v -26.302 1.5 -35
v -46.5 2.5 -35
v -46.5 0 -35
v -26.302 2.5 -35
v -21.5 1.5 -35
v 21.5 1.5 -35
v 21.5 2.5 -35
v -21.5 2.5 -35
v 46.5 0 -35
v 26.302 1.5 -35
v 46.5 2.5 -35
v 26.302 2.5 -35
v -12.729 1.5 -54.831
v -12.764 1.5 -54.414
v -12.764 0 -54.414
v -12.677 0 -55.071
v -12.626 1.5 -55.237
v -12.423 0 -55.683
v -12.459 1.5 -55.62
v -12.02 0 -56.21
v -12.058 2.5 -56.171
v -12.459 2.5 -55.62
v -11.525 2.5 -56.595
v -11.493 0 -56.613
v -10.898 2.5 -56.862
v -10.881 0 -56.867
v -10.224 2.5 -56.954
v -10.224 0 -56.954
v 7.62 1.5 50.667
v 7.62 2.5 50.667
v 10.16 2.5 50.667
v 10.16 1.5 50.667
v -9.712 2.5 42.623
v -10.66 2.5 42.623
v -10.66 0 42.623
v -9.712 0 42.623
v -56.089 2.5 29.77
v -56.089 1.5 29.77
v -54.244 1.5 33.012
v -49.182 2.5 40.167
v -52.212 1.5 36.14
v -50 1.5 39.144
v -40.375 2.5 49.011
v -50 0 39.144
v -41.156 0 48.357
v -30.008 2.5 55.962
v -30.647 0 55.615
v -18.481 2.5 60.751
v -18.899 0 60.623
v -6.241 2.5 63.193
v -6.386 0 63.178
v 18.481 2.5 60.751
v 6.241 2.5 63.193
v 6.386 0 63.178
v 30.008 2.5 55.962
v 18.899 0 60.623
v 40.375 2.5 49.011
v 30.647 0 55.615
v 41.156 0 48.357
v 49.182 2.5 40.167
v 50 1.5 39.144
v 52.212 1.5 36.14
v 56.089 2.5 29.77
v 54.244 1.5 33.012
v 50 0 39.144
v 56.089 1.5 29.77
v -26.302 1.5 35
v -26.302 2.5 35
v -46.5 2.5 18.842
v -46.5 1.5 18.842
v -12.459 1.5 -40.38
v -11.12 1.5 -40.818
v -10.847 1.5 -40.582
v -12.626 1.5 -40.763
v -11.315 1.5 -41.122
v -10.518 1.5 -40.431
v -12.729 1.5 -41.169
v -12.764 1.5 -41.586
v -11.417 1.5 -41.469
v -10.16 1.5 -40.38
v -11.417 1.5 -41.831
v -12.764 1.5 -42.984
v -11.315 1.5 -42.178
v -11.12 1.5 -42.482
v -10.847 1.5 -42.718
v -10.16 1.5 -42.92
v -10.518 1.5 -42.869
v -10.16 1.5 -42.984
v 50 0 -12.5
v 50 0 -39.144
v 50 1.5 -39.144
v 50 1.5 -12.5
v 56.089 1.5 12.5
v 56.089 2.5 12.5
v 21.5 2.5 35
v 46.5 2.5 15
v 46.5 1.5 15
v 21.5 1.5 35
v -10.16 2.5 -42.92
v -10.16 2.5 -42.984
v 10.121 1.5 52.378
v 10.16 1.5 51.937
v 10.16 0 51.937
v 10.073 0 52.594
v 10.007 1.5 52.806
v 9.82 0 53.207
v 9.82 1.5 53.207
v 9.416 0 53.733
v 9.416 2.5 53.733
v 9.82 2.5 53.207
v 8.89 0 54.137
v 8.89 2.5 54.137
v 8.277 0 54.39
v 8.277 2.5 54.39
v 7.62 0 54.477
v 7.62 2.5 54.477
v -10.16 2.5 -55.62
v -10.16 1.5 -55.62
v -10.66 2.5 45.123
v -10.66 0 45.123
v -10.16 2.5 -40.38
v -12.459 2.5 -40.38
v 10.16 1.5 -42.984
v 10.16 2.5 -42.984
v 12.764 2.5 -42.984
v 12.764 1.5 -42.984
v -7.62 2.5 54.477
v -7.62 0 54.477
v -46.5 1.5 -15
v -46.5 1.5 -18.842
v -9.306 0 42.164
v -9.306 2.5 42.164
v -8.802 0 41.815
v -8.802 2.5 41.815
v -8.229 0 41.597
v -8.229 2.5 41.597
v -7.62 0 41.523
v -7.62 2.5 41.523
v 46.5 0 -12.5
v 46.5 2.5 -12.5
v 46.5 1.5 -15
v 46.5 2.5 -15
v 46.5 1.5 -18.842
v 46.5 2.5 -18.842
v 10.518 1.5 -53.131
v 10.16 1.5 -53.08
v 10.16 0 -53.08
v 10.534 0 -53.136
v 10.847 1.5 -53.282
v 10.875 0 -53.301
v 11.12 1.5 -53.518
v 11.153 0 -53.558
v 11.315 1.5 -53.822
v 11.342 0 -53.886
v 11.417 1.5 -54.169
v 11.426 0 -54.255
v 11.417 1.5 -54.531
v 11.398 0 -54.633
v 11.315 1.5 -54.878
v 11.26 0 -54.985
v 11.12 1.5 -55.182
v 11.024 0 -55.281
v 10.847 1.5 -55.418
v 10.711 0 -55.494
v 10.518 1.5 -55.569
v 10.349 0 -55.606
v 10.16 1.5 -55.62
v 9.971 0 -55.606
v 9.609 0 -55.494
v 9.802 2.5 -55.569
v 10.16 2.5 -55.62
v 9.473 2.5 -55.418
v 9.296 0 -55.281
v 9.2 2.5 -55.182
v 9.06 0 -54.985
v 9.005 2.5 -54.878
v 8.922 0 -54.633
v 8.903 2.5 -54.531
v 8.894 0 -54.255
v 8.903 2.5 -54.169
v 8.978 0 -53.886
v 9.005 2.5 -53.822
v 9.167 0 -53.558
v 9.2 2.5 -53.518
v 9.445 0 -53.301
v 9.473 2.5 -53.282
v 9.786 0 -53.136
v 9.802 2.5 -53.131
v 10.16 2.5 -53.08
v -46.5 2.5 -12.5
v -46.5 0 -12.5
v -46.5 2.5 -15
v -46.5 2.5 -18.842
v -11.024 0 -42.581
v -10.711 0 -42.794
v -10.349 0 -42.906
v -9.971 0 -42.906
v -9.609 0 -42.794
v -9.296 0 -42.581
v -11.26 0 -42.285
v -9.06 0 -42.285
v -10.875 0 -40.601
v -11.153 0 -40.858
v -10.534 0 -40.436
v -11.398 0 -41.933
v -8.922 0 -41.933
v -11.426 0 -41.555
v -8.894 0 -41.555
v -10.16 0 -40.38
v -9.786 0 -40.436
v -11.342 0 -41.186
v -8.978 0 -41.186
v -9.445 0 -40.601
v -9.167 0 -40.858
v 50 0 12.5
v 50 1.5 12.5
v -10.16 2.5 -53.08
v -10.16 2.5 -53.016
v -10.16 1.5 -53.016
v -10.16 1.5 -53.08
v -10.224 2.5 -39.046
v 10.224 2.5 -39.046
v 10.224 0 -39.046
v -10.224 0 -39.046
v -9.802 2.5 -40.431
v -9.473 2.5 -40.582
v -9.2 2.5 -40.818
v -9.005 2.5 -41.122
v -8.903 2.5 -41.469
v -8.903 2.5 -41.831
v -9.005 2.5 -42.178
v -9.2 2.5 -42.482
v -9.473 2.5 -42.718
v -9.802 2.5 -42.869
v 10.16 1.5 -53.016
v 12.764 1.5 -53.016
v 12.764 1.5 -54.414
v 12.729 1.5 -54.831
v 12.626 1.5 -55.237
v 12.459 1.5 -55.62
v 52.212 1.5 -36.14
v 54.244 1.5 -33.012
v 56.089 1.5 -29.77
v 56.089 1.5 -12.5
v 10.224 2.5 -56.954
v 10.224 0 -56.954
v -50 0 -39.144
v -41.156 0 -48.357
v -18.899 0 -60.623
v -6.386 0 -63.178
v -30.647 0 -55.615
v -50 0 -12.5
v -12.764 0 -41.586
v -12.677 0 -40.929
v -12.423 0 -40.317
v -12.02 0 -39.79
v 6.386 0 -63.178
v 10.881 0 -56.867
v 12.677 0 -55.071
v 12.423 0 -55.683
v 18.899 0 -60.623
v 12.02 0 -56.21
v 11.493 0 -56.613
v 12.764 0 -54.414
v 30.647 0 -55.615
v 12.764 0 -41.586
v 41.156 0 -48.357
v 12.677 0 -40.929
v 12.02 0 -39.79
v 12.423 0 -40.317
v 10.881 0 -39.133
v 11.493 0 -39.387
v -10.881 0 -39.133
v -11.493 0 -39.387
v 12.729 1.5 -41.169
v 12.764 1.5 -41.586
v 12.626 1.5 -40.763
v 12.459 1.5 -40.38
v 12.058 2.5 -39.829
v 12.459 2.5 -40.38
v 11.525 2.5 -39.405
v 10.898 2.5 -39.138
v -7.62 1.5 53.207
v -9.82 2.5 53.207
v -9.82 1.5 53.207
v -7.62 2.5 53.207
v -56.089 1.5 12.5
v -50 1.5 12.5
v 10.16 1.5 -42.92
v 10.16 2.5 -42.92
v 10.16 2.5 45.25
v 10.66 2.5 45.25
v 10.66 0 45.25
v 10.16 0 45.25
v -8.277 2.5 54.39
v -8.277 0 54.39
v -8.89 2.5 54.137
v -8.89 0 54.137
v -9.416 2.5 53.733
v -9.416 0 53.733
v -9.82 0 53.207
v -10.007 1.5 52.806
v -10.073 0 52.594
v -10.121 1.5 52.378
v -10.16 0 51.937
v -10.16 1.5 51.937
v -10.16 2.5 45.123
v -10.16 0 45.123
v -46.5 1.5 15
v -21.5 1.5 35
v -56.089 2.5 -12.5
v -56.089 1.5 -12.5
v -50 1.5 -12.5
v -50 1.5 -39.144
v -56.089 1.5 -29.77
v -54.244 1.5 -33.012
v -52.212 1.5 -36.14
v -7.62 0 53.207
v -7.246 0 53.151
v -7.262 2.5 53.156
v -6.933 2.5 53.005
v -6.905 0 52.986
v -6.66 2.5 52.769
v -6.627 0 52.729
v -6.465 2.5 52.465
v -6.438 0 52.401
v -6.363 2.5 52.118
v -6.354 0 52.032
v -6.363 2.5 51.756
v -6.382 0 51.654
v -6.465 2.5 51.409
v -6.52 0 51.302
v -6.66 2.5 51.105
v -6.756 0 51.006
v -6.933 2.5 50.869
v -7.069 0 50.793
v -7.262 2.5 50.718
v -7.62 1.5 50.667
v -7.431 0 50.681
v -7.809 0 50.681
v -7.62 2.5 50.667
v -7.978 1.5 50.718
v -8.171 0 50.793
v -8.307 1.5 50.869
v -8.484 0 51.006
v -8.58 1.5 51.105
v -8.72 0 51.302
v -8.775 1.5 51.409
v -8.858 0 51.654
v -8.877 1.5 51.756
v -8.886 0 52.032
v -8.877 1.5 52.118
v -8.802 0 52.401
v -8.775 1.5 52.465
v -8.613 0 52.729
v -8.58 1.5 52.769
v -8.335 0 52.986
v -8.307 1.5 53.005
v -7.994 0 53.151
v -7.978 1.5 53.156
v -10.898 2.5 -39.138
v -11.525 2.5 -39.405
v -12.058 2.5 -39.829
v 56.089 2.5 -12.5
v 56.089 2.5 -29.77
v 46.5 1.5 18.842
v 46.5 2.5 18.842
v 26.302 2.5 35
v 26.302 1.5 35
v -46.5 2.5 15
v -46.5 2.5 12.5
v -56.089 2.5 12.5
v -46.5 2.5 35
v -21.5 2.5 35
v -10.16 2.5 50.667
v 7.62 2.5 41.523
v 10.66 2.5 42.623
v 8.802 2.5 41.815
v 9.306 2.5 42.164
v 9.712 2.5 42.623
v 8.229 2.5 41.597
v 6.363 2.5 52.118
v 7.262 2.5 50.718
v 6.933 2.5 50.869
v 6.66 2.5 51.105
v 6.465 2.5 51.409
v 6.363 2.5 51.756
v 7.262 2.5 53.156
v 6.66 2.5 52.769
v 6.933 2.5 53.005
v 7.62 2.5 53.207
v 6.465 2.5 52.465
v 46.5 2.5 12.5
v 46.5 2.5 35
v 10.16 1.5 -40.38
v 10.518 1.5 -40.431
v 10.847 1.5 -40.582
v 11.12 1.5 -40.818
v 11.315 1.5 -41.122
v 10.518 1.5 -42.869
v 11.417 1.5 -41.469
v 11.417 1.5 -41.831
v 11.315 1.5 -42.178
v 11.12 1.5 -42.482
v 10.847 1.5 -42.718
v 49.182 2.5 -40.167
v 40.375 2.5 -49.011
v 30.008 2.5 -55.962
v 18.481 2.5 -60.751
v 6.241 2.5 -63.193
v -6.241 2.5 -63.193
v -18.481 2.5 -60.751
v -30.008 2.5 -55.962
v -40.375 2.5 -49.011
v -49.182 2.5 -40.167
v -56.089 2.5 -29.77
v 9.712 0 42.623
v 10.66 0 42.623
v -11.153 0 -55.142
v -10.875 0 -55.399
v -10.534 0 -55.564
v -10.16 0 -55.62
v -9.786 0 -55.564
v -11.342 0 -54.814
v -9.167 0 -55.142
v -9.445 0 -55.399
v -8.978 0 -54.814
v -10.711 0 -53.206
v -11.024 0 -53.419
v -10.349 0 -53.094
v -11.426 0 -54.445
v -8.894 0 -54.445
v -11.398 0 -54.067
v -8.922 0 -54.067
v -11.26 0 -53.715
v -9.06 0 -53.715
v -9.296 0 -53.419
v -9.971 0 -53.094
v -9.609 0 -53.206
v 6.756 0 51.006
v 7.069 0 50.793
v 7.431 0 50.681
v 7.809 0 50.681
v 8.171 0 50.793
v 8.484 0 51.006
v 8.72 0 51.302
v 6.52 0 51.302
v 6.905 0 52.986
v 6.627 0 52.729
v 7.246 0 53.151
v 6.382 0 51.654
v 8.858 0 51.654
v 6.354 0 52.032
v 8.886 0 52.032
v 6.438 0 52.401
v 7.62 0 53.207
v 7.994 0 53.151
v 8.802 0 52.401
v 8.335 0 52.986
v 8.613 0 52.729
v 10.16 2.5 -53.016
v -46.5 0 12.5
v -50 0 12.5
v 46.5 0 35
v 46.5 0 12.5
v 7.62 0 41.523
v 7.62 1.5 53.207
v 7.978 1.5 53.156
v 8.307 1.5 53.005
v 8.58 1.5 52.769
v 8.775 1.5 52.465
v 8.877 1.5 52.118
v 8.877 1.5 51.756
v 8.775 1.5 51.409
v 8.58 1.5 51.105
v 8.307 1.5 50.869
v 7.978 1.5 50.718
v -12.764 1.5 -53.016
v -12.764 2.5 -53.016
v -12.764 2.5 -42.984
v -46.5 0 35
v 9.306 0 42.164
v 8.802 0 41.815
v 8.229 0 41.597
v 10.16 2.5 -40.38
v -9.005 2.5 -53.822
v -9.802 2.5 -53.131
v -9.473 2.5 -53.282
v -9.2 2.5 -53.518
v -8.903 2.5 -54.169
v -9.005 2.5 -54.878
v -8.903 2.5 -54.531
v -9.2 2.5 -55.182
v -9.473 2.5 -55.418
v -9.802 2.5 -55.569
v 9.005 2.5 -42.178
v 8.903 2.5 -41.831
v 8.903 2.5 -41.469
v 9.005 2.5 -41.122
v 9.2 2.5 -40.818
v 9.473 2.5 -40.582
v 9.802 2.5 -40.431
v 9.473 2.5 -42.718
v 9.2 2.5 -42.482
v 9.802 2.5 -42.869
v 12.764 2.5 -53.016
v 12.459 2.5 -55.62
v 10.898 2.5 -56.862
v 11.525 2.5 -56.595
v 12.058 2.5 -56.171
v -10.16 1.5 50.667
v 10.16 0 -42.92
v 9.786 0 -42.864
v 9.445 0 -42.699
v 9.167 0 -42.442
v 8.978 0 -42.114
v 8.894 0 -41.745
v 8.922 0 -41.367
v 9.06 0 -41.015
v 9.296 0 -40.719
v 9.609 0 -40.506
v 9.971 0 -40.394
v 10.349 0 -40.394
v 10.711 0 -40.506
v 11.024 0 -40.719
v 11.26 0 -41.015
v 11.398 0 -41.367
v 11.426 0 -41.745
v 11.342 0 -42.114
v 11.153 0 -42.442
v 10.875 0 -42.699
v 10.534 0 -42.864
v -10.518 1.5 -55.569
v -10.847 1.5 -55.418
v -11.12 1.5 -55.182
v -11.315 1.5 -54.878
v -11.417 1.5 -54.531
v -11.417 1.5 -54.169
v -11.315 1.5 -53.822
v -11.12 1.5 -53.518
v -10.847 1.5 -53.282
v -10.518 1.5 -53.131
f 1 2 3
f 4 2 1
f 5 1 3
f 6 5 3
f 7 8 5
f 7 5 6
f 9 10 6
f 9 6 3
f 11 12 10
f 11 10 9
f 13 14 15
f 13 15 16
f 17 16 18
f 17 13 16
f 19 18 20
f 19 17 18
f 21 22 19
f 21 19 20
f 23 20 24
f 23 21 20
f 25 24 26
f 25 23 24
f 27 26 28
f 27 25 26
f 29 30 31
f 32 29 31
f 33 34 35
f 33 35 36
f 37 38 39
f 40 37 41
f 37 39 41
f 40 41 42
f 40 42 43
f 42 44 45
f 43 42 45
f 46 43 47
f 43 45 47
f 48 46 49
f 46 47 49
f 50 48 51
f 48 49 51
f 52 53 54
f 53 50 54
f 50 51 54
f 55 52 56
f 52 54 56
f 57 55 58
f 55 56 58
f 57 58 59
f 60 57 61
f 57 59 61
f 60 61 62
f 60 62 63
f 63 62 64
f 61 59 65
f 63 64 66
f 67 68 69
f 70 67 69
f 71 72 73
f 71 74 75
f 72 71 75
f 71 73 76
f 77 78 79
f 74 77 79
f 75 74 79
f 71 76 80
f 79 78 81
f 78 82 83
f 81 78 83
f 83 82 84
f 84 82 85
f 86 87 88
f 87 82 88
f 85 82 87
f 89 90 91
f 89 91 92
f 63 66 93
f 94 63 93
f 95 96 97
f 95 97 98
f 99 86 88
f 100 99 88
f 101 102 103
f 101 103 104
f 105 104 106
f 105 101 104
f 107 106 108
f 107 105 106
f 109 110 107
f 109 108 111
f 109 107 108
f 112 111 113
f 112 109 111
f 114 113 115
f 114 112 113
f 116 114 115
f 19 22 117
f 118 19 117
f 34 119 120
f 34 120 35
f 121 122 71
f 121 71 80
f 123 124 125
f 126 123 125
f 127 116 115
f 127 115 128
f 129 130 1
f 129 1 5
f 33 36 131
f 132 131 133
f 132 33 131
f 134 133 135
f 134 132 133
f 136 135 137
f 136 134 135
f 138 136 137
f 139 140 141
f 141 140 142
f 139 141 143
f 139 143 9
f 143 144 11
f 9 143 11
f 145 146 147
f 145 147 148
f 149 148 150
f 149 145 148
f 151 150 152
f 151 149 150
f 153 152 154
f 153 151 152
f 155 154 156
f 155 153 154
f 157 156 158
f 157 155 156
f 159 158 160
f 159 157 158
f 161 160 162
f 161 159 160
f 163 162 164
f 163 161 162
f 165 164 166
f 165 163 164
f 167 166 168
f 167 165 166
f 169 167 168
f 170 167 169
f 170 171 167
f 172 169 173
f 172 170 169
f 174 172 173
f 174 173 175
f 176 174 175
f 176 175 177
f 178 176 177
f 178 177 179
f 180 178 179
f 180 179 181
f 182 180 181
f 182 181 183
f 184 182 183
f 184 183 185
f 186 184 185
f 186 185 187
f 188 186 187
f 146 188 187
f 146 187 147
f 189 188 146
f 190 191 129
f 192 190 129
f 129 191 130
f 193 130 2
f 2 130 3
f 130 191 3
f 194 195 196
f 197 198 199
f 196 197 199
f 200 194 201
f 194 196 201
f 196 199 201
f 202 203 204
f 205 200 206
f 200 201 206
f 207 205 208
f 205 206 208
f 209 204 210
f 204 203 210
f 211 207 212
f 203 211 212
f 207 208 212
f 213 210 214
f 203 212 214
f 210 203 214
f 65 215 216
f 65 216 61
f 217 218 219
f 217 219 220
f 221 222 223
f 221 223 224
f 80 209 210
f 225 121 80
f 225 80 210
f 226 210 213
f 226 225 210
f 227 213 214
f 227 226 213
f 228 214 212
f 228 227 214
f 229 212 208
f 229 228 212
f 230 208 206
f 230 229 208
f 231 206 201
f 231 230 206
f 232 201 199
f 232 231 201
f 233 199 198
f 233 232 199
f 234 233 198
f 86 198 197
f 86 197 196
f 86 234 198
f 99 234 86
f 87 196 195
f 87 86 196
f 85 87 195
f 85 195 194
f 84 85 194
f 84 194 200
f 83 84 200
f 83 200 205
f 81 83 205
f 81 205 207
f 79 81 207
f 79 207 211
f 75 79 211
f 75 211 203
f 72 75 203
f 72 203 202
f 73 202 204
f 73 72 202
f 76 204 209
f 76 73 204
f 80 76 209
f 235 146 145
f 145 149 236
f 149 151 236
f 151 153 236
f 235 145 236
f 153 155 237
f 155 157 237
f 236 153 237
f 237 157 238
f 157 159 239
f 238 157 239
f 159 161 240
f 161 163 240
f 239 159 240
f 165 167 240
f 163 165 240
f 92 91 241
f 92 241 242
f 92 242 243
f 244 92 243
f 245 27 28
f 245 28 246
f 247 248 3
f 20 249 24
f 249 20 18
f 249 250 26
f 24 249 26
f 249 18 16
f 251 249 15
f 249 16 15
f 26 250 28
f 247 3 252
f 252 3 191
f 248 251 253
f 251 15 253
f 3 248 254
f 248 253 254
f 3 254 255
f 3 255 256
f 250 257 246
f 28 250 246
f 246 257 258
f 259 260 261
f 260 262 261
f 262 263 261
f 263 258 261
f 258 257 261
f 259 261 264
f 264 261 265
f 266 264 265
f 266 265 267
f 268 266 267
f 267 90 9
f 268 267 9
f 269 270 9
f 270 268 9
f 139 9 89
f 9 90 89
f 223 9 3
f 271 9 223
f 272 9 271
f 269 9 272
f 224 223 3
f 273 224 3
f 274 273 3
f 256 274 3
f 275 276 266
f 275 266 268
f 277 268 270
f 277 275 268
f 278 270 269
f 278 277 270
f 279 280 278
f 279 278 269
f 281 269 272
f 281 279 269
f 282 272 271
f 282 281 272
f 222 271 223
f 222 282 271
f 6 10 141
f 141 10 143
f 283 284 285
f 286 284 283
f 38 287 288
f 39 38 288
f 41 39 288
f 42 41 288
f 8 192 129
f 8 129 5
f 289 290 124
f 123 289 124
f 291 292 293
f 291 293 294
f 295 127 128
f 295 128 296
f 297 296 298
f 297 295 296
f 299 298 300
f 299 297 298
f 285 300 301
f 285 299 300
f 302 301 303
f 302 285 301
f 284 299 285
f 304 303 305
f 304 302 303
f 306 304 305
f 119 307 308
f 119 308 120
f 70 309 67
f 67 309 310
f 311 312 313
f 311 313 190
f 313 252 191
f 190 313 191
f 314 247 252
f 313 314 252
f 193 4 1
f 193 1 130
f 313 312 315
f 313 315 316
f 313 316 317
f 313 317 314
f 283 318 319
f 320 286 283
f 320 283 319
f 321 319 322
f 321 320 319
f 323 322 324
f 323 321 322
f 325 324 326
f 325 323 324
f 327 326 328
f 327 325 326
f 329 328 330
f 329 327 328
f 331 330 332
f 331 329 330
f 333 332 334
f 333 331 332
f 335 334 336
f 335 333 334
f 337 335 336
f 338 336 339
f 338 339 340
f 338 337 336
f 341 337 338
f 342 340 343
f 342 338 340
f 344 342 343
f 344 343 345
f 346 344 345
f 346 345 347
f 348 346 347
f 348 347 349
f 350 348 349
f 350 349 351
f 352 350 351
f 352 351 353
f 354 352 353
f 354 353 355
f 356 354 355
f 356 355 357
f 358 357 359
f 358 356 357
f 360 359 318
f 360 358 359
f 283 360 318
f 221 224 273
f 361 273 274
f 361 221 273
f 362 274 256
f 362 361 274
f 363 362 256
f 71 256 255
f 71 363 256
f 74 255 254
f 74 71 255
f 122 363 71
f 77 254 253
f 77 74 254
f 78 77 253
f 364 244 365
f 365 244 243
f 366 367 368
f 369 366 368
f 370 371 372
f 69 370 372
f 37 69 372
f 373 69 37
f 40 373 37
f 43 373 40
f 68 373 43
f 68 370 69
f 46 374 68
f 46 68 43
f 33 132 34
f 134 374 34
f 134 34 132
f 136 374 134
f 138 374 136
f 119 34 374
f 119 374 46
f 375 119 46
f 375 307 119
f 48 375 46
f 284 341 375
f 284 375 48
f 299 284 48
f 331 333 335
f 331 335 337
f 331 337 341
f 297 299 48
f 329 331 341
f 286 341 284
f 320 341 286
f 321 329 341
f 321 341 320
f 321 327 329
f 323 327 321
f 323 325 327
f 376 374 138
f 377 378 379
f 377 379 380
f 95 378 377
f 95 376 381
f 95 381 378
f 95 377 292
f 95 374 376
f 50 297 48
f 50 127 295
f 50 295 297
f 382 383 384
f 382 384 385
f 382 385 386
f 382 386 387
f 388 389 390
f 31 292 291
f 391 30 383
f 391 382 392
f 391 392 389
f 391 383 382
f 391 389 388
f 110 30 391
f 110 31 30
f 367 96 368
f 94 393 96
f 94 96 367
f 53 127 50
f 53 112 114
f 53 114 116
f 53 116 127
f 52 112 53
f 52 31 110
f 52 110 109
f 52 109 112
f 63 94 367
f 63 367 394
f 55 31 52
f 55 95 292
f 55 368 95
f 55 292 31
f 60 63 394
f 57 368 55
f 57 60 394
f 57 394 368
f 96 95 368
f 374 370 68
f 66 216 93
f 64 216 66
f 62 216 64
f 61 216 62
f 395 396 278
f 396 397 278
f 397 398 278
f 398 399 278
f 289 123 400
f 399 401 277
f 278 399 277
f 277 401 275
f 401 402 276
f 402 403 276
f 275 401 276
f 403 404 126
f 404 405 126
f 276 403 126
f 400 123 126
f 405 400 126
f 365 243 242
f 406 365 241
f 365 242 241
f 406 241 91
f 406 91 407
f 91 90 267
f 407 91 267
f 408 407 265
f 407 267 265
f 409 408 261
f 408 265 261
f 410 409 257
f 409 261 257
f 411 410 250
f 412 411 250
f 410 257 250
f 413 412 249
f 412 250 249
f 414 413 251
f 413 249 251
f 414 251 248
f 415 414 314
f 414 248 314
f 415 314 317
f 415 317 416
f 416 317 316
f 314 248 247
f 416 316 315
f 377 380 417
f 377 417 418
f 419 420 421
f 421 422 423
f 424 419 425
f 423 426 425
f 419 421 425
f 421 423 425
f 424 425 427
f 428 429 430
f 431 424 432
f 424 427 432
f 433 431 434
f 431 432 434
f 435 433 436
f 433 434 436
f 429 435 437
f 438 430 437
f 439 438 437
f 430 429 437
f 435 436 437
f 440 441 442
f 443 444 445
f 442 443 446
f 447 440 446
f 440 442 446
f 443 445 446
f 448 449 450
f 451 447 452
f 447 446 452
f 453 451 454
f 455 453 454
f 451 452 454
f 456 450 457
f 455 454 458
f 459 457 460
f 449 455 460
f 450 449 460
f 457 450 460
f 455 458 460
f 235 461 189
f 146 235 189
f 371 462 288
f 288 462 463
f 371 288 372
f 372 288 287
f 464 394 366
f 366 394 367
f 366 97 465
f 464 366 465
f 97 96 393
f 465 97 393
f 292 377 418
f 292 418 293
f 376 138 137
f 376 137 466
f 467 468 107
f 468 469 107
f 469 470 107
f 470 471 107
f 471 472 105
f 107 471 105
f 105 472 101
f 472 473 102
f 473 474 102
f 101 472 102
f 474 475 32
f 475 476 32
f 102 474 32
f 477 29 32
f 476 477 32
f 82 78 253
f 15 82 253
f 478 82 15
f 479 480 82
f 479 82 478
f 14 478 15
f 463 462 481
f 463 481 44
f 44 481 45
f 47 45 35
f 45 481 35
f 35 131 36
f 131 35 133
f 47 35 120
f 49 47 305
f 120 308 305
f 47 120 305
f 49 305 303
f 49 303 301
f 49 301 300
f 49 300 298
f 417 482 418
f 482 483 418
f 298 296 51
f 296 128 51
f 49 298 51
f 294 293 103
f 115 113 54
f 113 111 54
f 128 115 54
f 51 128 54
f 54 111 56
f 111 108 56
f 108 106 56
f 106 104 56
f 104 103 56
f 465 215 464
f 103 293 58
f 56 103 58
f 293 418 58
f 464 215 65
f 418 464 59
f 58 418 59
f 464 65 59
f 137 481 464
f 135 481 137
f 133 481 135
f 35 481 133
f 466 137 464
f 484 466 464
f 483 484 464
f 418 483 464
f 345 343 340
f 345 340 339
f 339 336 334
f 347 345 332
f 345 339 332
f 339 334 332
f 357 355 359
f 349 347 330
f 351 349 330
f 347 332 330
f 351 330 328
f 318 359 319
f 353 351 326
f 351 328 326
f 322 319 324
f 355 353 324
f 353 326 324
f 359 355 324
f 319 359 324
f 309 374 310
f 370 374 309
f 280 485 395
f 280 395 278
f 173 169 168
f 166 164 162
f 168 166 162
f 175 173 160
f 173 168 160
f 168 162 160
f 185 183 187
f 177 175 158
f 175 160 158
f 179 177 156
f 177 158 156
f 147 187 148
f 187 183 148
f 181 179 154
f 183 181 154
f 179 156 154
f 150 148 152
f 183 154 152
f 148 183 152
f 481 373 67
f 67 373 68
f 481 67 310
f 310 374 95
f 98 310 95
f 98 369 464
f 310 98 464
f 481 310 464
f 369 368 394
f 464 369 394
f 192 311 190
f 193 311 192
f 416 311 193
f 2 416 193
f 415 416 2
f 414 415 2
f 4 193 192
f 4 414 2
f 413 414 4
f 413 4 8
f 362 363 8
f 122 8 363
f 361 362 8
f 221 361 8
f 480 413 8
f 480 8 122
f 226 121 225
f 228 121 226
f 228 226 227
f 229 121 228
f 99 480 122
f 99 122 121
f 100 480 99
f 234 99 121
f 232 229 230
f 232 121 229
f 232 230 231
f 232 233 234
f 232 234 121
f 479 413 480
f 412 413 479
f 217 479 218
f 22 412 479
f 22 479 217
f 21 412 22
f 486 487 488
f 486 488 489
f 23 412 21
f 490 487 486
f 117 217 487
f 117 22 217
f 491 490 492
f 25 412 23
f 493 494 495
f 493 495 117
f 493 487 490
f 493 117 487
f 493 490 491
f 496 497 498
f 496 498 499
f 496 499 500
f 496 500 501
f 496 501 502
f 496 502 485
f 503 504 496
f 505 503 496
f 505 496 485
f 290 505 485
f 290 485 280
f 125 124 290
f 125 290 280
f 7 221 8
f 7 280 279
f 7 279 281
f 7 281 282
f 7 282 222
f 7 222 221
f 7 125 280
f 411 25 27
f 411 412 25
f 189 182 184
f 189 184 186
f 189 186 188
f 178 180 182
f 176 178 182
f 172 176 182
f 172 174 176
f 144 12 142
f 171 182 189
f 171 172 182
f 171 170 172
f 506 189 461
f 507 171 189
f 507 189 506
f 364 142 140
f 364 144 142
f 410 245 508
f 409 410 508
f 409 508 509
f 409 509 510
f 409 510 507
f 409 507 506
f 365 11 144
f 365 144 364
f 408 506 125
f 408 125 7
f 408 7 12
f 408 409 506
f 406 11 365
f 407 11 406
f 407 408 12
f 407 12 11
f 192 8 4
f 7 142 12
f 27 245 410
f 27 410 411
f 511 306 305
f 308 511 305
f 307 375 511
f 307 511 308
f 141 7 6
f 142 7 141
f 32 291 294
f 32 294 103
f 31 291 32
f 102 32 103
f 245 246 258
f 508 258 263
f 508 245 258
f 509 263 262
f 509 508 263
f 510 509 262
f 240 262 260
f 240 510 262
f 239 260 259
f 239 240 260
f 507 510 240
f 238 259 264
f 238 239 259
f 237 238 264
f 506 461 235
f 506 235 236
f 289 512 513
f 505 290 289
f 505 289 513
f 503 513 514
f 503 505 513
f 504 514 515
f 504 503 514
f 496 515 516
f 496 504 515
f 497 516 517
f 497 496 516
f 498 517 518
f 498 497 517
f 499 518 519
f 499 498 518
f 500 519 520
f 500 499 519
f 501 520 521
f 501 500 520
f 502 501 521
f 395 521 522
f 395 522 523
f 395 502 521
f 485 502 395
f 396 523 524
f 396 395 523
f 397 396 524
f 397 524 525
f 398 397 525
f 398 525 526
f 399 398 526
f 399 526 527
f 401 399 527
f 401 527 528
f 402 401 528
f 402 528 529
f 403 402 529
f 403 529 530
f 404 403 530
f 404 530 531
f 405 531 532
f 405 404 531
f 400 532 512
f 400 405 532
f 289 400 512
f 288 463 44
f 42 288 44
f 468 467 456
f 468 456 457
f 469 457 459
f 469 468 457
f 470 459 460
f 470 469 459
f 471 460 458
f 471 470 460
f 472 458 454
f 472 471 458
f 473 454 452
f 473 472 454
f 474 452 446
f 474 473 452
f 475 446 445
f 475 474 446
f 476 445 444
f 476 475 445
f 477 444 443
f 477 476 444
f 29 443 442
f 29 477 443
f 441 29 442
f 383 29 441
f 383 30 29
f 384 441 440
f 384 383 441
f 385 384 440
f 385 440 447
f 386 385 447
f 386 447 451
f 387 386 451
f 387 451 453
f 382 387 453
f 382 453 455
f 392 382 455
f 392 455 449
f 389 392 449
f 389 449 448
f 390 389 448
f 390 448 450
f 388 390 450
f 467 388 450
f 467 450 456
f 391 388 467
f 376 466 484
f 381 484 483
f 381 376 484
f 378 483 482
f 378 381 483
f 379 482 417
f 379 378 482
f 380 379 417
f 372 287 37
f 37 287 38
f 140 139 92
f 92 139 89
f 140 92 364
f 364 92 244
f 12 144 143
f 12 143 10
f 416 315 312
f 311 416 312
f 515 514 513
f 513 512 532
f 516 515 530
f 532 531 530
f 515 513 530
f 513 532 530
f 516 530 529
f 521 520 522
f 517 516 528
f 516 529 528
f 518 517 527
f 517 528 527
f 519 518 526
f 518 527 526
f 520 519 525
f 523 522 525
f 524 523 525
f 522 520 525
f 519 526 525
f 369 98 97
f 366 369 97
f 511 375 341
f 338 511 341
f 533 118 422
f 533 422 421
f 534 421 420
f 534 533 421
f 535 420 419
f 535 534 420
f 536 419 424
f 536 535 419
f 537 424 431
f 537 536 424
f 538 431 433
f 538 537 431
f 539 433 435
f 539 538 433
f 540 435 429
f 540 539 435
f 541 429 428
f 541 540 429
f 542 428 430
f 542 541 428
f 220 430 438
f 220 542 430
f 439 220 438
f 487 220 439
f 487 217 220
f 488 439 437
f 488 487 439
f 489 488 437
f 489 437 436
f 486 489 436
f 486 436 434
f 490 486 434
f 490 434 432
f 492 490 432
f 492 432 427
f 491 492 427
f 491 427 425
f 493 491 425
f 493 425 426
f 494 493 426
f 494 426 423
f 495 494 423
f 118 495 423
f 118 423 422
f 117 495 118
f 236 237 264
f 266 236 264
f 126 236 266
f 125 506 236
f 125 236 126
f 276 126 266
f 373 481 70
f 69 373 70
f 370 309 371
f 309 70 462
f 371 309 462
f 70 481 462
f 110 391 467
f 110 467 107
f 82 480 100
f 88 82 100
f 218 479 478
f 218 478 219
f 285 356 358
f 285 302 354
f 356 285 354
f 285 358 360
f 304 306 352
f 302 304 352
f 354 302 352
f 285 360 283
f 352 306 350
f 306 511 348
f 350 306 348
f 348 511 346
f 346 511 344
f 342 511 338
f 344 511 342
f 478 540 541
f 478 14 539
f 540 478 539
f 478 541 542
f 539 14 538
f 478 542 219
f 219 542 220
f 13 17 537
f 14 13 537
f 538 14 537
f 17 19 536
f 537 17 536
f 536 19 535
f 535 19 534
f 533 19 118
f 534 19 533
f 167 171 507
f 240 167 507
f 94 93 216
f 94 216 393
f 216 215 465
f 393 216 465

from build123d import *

# Parameters (mm, degrees)
SKETCH1_R           = 63.5
BOSS_EXTRUDE1_DEPTH = 2.5
CUT_EXTRUDE3_DEPTH  = 10
SKETCH2_W           = 93
SKETCH2_H           = 70
CUT_EXTRUDE4_DEPTH  = 1.5
CUT_EXTRUDE5_START  = -10
CUT_EXTRUDE5_DEPTH  = 10
SKETCH6_W           = 10
SKETCH6_H           = 26.950646815
CUT_EXTRUDE6_DEPTH  = 1.5
SKETCH7_R           = 1.27
CUT_EXTRUDE7_DEPTH  = 85.761427807
SKETCH8_W           = 2.6035
SKETCH8_H           = 2.6035
SKETCH8_W_2         = 2.54
SKETCH8_H_2         = 2.54
BOSS_EXTRUDE4_DEPTH = 1


with BuildPart() as part:
    # Sketch1 → Boss-Extrude1 (new body)
    with BuildSketch(Plane(origin=(0, 0, 0), x_dir=(1, 0, 0), z_dir=(0, 1, 0))):
        with Locations(Location((0, 0, 0), (0, 0, 270))):
            Circle(SKETCH1_R)
    extrude(amount=BOSS_EXTRUDE1_DEPTH)

    # Sketch4 → Cut-Extrude3 (cut)
    with BuildSketch(Plane(origin=(0, 2.5, 0), x_dir=(1, 0, 0), z_dir=(0, 1, 0))):
        Polygon((-46.5, 15), (-21.5, 35), (21.5, 35), (46.5, 15), (46.5, -15), (21.5, -35), (-21.5, -35), (-46.5, -15), align=None)
        Polygon((-46.5, 35), (-26.302343178, 35), (-46.5, 18.841874542), align=None)
        Polygon((-46.5, -35), (-26.302343178, -35), (-46.5, -18.841874542), align=None)
        Polygon((46.5, 35), (46.5, 18.841874542), (26.302343178, 35), align=None)
        Polygon((46.5, -18.841874542), (26.302343178, -35), (46.5, -35), align=None)
    extrude(amount=-CUT_EXTRUDE3_DEPTH, mode=Mode.SUBTRACT)

    # Sketch2 → Cut-Extrude4 (cut)
    with BuildSketch(Plane(origin=(0, 0, 0), x_dir=(1, 0, 0), z_dir=(0, 1, 0))):
        Rectangle(SKETCH2_W, SKETCH2_H)
    extrude(amount=CUT_EXTRUDE4_DEPTH, mode=Mode.SUBTRACT)

    # Sketch5 → Cut-Extrude5 (cut)
    with BuildSketch(Plane(origin=(0, 2.5, 0), x_dir=(1, 0, 0), z_dir=(0, 1, 0)).offset(CUT_EXTRUDE5_START)):
        with BuildLine():
            Line((-56.089211476, 12.5), (-46.5, 12.5))
            Line((-46.5, 12.5), (-46.5, -12.5))
            Line((-46.5, -12.5), (-56.089211476, -12.5))
            Line((-56.089211476, -12.5), (-56.089211476, -29.769957273))
            ThreePointArc((-56.089211476, -29.769957273), (-63.5, 0), (-56.089211476, 29.769957273))
            Line((-56.089211476, 29.769957273), (-56.089211476, 12.5))
        make_face()
        with BuildLine():
            Line((56.089211476, 12.5), (56.089211476, 29.769957273))
            ThreePointArc((56.089211476, 29.769957273), (63.5, 0), (56.089211476, -29.769957273))
            Line((56.089211476, -29.769957273), (56.089211476, -12.5))
            Line((56.089211476, -12.5), (46.5, -12.5))
            Line((46.5, -12.5), (46.5, 12.5))
            Line((46.5, 12.5), (56.089211476, 12.5))
        make_face()
    extrude(amount=CUT_EXTRUDE5_DEPTH, mode=Mode.SUBTRACT)


with BuildPart() as cut_extrude5_piece_1:
    # of the separate pieces the step leaves, piece 1, a body of its own (cut_extrude5_pieces)
    add(part.part.solids().sort_by_distance((56.089211476, 0, -29.769957273))[0])


with BuildPart() as cut_extrude5_piece_2:
    # of the separate pieces the step leaves, piece 2, a body of its own (cut_extrude5_pieces)
    add(part.part.solids().sort_by_distance((-56.089211476, 0, 29.769957273))[0])


with BuildPart() as cut_extrude6_tool:
    # Sketch6 → Cut-Extrude6 (new body)
    with BuildSketch(Plane.XZ):
        with Locations((55, -25.975323407)):
            Rectangle(SKETCH6_W, SKETCH6_H)
        with Locations((-55, -25.975323407)):
            Rectangle(SKETCH6_W, SKETCH6_H)
        with Locations((-55, 25.975323407)):
            Rectangle(SKETCH6_W, SKETCH6_H)
        with Locations((55, 25.975323407)):
            Rectangle(SKETCH6_W, SKETCH6_H)
    extrude(amount=-CUT_EXTRUDE6_DEPTH)


with BuildPart() as cut_extrude5_piece_1_1:
    add(cut_extrude5_piece_1.part)

    # Cut-Extrude6: cut by cut_extrude6_tool
    add(cut_extrude6_tool.part, mode=Mode.SUBTRACT)


with BuildPart() as cut_extrude5_piece_2_1:
    add(cut_extrude5_piece_2.part)

    # Cut-Extrude6: cut by cut_extrude6_tool
    add(cut_extrude6_tool.part, mode=Mode.SUBTRACT)


with BuildPart() as cut_extrude7_tool:
    # Sketch7 → Cut-Extrude7 (new, through all)
    # profile 1 of 2: a face of its own
    with BuildSketch(Plane(origin=(0, 2.5, 0), x_dir=(1, 0, 0), z_dir=(0, 1, 0))):
        with BuildLine():
            Line((-10.2235, 56.9535), (10.2235, 56.9535))
            ThreePointArc((10.2235, 56.9535), (12.019551224, 56.209551224), (12.7635, 54.4135))
            Line((12.7635, 54.4135), (12.7635, 41.5865))
            ThreePointArc((12.7635, 41.5865), (12.019551224, 39.790448776), (10.2235, 39.0465))
            Line((10.2235, 39.0465), (-10.2235, 39.0465))
            ThreePointArc((-10.2235, 39.0465), (-12.019551224, 39.790448776), (-12.7635, 41.5865))
            Line((-12.7635, 41.5865), (-12.7635, 54.4135))
            ThreePointArc((-12.7635, 54.4135), (-12.019551224, 56.209551224), (-10.2235, 56.9535))
        make_face()
        with Locations(Location((10.16, 54.35, 0), (0, 0, 270))):
            Circle(SKETCH7_R, mode=Mode.SUBTRACT)
        with Locations(Location((-10.16, 54.35, 0), (0, 0, 90))):
            Circle(SKETCH7_R, mode=Mode.SUBTRACT)
        with Locations(Location((10.16, 41.65, 0), (0, 0, 90))):
            Circle(SKETCH7_R, mode=Mode.SUBTRACT)
        with Locations(Location((-10.16, 41.65, 0), (0, 0, 270))):
            Circle(SKETCH7_R, mode=Mode.SUBTRACT)
    # profile 2 of 2: a face of its own
    with BuildSketch(Plane(origin=(0, 2.5, 0), x_dir=(1, 0, 0), z_dir=(0, 1, 0))):
        with BuildLine():
            Line((-7.62, -41.523), (7.62, -41.523))
            ThreePointArc((7.62, -41.523), (8.801947545, -41.814756241), (9.712367081, -42.623))
            Line((9.712367081, -42.623), (10.66, -42.623))
            Line((10.66, -42.623), (10.66, -45.25))
            Line((10.66, -45.25), (10.16, -45.25))
            Line((10.16, -45.25), (10.16, -51.937))
            ThreePointArc((10.16, -51.937), (9.416051224, -53.733051224), (7.62, -54.477))
            Line((7.62, -54.477), (-7.62, -54.477))
            ThreePointArc((-7.62, -54.477), (-9.416051224, -53.733051224), (-10.16, -51.937))
            Line((-10.16, -51.937), (-10.16, -45.123))
            Line((-10.16, -45.123), (-10.66, -45.123))
            Line((-10.66, -45.123), (-10.66, -42.623))
            Line((-10.66, -42.623), (-9.712367081, -42.623))
            ThreePointArc((-9.712367081, -42.623), (-8.801947545, -41.814756241), (-7.62, -41.523))
        make_face()
        with Locations(Location((-7.62, -51.937, 0), (0, 0, 270))):
            Circle(SKETCH7_R, mode=Mode.SUBTRACT)
        with Locations(Location((7.62, -51.937, 0), (0, 0, 270))):
            Circle(SKETCH7_R, mode=Mode.SUBTRACT)
    extrude(amount=-CUT_EXTRUDE7_DEPTH)


with BuildPart() as cut_extrude5_piece_1_2:
    add(cut_extrude5_piece_1_1.part)

    # Cut-Extrude7: cut by cut_extrude7_tool
    add(cut_extrude7_tool.part, mode=Mode.SUBTRACT)


with BuildPart() as cut_extrude5_piece_2_2:
    add(cut_extrude5_piece_2_1.part)

    # Cut-Extrude7: cut by cut_extrude7_tool
    add(cut_extrude7_tool.part, mode=Mode.SUBTRACT)


with BuildPart() as cut_extrude7_piece_1:
    # of the separate pieces the step leaves, piece 1, a body of its own (cut_extrude7_pieces)
    add(cut_extrude5_piece_1_2.part.solids().sort_by_distance((50, 0, -39.143965052))[0])



with BuildPart() as cut_extrude7_piece_2:
    # of the separate pieces the step leaves, piece 2, a body of its own (cut_extrude7_pieces)
    add(cut_extrude5_piece_1_2.part.solids().sort_by_distance((-10.16, 0, -40.38))[0])


with BuildPart() as cut_extrude7_piece_3:
    # of the separate pieces the step leaves, piece 3, a body of its own (cut_extrude7_pieces)
    add(cut_extrude5_piece_1_2.part.solids().sort_by_distance((-10.16, 0, -55.62))[0])


with BuildPart() as cut_extrude7_piece_4:
    # of the separate pieces the step leaves, piece 4, a body of its own (cut_extrude7_pieces)
    add(cut_extrude5_piece_1_2.part.solids().sort_by_distance((10.16, 0, -42.92))[0])


with BuildPart() as cut_extrude7_piece_5:
    # of the separate pieces the step leaves, piece 5, a body of its own (cut_extrude7_pieces)
    add(cut_extrude5_piece_1_2.part.solids().sort_by_distance((10.16, 0, -53.08))[0])


with BuildPart() as cut_extrude7_piece_1_of_cut_extrude5_pie:
    # of the separate pieces the step leaves, piece 1, a body of its own (cut_extrude7_pieces_of_cut_extrude5_piec)
    add(cut_extrude5_piece_2_2.part.solids().sort_by_distance((-50, 0, 39.143965052))[0])


with BuildPart() as cut_extrude7_piece_2_of_cut_extrude5_pie:
    # of the separate pieces the step leaves, piece 2, a body of its own (cut_extrude7_pieces_of_cut_extrude5_piec)
    add(cut_extrude5_piece_2_2.part.solids().sort_by_distance((-7.62, 0, 53.207))[0])


with BuildPart() as cut_extrude7_piece_3_of_cut_extrude5_pie:
    # of the separate pieces the step leaves, piece 3, a body of its own (cut_extrude7_pieces_of_cut_extrude5_piec)
    add(cut_extrude5_piece_2_2.part.solids().sort_by_distance((7.62, 0, 53.207))[0])


with BuildPart() as cut_extrude7_piece_1_1:
    add(cut_extrude7_piece_1.part)

    add(cut_extrude7_piece_2.part)  # Boss-Extrude4 merges Cut-Extrude7 piece 2

    add(cut_extrude7_piece_3.part)  # Boss-Extrude4 merges Cut-Extrude7 piece 3

    add(cut_extrude7_piece_4.part)  # Boss-Extrude4 merges Cut-Extrude7 piece 4

    add(cut_extrude7_piece_5.part)  # Boss-Extrude4 merges Cut-Extrude7 piece 5

    add(cut_extrude7_piece_1_of_cut_extrude5_pie.part)  # Boss-Extrude4 merges Cut-Extrude7 piece 1 of Cut-Extrude5 pie

    add(cut_extrude7_piece_2_of_cut_extrude5_pie.part)  # Boss-Extrude4 merges Cut-Extrude7 piece 2 of Cut-Extrude5 pie

    add(cut_extrude7_piece_3_of_cut_extrude5_pie.part)  # Boss-Extrude4 merges Cut-Extrude7 piece 3 of Cut-Extrude5 pie
    # Sketch8 → Boss-Extrude4 (add)
    with BuildSketch(Plane(origin=(0, 2.5, 0), x_dir=(1, 0, 0), z_dir=(0, 1, 0))):
        with Locations((11.46175, 54.31825)):
            Rectangle(SKETCH8_W, SKETCH8_H)
        with Locations((-11.46175, 54.31825)):
            Rectangle(SKETCH8_W, SKETCH8_H)
        with Locations((-11.46175, 41.68175)):
            Rectangle(SKETCH8_W, SKETCH8_H)
        with Locations((11.46175, 41.68175)):
            Rectangle(SKETCH8_W, SKETCH8_H)
        with Locations((-8.89, -51.937)):
            Rectangle(SKETCH8_W_2, SKETCH8_H_2)
        with Locations((8.89, -51.937)):
            Rectangle(SKETCH8_W_2, SKETCH8_H_2)
    extrude(amount=-BOSS_EXTRUDE4_DEPTH)


solid = cut_extrude7_piece_1_1.part
